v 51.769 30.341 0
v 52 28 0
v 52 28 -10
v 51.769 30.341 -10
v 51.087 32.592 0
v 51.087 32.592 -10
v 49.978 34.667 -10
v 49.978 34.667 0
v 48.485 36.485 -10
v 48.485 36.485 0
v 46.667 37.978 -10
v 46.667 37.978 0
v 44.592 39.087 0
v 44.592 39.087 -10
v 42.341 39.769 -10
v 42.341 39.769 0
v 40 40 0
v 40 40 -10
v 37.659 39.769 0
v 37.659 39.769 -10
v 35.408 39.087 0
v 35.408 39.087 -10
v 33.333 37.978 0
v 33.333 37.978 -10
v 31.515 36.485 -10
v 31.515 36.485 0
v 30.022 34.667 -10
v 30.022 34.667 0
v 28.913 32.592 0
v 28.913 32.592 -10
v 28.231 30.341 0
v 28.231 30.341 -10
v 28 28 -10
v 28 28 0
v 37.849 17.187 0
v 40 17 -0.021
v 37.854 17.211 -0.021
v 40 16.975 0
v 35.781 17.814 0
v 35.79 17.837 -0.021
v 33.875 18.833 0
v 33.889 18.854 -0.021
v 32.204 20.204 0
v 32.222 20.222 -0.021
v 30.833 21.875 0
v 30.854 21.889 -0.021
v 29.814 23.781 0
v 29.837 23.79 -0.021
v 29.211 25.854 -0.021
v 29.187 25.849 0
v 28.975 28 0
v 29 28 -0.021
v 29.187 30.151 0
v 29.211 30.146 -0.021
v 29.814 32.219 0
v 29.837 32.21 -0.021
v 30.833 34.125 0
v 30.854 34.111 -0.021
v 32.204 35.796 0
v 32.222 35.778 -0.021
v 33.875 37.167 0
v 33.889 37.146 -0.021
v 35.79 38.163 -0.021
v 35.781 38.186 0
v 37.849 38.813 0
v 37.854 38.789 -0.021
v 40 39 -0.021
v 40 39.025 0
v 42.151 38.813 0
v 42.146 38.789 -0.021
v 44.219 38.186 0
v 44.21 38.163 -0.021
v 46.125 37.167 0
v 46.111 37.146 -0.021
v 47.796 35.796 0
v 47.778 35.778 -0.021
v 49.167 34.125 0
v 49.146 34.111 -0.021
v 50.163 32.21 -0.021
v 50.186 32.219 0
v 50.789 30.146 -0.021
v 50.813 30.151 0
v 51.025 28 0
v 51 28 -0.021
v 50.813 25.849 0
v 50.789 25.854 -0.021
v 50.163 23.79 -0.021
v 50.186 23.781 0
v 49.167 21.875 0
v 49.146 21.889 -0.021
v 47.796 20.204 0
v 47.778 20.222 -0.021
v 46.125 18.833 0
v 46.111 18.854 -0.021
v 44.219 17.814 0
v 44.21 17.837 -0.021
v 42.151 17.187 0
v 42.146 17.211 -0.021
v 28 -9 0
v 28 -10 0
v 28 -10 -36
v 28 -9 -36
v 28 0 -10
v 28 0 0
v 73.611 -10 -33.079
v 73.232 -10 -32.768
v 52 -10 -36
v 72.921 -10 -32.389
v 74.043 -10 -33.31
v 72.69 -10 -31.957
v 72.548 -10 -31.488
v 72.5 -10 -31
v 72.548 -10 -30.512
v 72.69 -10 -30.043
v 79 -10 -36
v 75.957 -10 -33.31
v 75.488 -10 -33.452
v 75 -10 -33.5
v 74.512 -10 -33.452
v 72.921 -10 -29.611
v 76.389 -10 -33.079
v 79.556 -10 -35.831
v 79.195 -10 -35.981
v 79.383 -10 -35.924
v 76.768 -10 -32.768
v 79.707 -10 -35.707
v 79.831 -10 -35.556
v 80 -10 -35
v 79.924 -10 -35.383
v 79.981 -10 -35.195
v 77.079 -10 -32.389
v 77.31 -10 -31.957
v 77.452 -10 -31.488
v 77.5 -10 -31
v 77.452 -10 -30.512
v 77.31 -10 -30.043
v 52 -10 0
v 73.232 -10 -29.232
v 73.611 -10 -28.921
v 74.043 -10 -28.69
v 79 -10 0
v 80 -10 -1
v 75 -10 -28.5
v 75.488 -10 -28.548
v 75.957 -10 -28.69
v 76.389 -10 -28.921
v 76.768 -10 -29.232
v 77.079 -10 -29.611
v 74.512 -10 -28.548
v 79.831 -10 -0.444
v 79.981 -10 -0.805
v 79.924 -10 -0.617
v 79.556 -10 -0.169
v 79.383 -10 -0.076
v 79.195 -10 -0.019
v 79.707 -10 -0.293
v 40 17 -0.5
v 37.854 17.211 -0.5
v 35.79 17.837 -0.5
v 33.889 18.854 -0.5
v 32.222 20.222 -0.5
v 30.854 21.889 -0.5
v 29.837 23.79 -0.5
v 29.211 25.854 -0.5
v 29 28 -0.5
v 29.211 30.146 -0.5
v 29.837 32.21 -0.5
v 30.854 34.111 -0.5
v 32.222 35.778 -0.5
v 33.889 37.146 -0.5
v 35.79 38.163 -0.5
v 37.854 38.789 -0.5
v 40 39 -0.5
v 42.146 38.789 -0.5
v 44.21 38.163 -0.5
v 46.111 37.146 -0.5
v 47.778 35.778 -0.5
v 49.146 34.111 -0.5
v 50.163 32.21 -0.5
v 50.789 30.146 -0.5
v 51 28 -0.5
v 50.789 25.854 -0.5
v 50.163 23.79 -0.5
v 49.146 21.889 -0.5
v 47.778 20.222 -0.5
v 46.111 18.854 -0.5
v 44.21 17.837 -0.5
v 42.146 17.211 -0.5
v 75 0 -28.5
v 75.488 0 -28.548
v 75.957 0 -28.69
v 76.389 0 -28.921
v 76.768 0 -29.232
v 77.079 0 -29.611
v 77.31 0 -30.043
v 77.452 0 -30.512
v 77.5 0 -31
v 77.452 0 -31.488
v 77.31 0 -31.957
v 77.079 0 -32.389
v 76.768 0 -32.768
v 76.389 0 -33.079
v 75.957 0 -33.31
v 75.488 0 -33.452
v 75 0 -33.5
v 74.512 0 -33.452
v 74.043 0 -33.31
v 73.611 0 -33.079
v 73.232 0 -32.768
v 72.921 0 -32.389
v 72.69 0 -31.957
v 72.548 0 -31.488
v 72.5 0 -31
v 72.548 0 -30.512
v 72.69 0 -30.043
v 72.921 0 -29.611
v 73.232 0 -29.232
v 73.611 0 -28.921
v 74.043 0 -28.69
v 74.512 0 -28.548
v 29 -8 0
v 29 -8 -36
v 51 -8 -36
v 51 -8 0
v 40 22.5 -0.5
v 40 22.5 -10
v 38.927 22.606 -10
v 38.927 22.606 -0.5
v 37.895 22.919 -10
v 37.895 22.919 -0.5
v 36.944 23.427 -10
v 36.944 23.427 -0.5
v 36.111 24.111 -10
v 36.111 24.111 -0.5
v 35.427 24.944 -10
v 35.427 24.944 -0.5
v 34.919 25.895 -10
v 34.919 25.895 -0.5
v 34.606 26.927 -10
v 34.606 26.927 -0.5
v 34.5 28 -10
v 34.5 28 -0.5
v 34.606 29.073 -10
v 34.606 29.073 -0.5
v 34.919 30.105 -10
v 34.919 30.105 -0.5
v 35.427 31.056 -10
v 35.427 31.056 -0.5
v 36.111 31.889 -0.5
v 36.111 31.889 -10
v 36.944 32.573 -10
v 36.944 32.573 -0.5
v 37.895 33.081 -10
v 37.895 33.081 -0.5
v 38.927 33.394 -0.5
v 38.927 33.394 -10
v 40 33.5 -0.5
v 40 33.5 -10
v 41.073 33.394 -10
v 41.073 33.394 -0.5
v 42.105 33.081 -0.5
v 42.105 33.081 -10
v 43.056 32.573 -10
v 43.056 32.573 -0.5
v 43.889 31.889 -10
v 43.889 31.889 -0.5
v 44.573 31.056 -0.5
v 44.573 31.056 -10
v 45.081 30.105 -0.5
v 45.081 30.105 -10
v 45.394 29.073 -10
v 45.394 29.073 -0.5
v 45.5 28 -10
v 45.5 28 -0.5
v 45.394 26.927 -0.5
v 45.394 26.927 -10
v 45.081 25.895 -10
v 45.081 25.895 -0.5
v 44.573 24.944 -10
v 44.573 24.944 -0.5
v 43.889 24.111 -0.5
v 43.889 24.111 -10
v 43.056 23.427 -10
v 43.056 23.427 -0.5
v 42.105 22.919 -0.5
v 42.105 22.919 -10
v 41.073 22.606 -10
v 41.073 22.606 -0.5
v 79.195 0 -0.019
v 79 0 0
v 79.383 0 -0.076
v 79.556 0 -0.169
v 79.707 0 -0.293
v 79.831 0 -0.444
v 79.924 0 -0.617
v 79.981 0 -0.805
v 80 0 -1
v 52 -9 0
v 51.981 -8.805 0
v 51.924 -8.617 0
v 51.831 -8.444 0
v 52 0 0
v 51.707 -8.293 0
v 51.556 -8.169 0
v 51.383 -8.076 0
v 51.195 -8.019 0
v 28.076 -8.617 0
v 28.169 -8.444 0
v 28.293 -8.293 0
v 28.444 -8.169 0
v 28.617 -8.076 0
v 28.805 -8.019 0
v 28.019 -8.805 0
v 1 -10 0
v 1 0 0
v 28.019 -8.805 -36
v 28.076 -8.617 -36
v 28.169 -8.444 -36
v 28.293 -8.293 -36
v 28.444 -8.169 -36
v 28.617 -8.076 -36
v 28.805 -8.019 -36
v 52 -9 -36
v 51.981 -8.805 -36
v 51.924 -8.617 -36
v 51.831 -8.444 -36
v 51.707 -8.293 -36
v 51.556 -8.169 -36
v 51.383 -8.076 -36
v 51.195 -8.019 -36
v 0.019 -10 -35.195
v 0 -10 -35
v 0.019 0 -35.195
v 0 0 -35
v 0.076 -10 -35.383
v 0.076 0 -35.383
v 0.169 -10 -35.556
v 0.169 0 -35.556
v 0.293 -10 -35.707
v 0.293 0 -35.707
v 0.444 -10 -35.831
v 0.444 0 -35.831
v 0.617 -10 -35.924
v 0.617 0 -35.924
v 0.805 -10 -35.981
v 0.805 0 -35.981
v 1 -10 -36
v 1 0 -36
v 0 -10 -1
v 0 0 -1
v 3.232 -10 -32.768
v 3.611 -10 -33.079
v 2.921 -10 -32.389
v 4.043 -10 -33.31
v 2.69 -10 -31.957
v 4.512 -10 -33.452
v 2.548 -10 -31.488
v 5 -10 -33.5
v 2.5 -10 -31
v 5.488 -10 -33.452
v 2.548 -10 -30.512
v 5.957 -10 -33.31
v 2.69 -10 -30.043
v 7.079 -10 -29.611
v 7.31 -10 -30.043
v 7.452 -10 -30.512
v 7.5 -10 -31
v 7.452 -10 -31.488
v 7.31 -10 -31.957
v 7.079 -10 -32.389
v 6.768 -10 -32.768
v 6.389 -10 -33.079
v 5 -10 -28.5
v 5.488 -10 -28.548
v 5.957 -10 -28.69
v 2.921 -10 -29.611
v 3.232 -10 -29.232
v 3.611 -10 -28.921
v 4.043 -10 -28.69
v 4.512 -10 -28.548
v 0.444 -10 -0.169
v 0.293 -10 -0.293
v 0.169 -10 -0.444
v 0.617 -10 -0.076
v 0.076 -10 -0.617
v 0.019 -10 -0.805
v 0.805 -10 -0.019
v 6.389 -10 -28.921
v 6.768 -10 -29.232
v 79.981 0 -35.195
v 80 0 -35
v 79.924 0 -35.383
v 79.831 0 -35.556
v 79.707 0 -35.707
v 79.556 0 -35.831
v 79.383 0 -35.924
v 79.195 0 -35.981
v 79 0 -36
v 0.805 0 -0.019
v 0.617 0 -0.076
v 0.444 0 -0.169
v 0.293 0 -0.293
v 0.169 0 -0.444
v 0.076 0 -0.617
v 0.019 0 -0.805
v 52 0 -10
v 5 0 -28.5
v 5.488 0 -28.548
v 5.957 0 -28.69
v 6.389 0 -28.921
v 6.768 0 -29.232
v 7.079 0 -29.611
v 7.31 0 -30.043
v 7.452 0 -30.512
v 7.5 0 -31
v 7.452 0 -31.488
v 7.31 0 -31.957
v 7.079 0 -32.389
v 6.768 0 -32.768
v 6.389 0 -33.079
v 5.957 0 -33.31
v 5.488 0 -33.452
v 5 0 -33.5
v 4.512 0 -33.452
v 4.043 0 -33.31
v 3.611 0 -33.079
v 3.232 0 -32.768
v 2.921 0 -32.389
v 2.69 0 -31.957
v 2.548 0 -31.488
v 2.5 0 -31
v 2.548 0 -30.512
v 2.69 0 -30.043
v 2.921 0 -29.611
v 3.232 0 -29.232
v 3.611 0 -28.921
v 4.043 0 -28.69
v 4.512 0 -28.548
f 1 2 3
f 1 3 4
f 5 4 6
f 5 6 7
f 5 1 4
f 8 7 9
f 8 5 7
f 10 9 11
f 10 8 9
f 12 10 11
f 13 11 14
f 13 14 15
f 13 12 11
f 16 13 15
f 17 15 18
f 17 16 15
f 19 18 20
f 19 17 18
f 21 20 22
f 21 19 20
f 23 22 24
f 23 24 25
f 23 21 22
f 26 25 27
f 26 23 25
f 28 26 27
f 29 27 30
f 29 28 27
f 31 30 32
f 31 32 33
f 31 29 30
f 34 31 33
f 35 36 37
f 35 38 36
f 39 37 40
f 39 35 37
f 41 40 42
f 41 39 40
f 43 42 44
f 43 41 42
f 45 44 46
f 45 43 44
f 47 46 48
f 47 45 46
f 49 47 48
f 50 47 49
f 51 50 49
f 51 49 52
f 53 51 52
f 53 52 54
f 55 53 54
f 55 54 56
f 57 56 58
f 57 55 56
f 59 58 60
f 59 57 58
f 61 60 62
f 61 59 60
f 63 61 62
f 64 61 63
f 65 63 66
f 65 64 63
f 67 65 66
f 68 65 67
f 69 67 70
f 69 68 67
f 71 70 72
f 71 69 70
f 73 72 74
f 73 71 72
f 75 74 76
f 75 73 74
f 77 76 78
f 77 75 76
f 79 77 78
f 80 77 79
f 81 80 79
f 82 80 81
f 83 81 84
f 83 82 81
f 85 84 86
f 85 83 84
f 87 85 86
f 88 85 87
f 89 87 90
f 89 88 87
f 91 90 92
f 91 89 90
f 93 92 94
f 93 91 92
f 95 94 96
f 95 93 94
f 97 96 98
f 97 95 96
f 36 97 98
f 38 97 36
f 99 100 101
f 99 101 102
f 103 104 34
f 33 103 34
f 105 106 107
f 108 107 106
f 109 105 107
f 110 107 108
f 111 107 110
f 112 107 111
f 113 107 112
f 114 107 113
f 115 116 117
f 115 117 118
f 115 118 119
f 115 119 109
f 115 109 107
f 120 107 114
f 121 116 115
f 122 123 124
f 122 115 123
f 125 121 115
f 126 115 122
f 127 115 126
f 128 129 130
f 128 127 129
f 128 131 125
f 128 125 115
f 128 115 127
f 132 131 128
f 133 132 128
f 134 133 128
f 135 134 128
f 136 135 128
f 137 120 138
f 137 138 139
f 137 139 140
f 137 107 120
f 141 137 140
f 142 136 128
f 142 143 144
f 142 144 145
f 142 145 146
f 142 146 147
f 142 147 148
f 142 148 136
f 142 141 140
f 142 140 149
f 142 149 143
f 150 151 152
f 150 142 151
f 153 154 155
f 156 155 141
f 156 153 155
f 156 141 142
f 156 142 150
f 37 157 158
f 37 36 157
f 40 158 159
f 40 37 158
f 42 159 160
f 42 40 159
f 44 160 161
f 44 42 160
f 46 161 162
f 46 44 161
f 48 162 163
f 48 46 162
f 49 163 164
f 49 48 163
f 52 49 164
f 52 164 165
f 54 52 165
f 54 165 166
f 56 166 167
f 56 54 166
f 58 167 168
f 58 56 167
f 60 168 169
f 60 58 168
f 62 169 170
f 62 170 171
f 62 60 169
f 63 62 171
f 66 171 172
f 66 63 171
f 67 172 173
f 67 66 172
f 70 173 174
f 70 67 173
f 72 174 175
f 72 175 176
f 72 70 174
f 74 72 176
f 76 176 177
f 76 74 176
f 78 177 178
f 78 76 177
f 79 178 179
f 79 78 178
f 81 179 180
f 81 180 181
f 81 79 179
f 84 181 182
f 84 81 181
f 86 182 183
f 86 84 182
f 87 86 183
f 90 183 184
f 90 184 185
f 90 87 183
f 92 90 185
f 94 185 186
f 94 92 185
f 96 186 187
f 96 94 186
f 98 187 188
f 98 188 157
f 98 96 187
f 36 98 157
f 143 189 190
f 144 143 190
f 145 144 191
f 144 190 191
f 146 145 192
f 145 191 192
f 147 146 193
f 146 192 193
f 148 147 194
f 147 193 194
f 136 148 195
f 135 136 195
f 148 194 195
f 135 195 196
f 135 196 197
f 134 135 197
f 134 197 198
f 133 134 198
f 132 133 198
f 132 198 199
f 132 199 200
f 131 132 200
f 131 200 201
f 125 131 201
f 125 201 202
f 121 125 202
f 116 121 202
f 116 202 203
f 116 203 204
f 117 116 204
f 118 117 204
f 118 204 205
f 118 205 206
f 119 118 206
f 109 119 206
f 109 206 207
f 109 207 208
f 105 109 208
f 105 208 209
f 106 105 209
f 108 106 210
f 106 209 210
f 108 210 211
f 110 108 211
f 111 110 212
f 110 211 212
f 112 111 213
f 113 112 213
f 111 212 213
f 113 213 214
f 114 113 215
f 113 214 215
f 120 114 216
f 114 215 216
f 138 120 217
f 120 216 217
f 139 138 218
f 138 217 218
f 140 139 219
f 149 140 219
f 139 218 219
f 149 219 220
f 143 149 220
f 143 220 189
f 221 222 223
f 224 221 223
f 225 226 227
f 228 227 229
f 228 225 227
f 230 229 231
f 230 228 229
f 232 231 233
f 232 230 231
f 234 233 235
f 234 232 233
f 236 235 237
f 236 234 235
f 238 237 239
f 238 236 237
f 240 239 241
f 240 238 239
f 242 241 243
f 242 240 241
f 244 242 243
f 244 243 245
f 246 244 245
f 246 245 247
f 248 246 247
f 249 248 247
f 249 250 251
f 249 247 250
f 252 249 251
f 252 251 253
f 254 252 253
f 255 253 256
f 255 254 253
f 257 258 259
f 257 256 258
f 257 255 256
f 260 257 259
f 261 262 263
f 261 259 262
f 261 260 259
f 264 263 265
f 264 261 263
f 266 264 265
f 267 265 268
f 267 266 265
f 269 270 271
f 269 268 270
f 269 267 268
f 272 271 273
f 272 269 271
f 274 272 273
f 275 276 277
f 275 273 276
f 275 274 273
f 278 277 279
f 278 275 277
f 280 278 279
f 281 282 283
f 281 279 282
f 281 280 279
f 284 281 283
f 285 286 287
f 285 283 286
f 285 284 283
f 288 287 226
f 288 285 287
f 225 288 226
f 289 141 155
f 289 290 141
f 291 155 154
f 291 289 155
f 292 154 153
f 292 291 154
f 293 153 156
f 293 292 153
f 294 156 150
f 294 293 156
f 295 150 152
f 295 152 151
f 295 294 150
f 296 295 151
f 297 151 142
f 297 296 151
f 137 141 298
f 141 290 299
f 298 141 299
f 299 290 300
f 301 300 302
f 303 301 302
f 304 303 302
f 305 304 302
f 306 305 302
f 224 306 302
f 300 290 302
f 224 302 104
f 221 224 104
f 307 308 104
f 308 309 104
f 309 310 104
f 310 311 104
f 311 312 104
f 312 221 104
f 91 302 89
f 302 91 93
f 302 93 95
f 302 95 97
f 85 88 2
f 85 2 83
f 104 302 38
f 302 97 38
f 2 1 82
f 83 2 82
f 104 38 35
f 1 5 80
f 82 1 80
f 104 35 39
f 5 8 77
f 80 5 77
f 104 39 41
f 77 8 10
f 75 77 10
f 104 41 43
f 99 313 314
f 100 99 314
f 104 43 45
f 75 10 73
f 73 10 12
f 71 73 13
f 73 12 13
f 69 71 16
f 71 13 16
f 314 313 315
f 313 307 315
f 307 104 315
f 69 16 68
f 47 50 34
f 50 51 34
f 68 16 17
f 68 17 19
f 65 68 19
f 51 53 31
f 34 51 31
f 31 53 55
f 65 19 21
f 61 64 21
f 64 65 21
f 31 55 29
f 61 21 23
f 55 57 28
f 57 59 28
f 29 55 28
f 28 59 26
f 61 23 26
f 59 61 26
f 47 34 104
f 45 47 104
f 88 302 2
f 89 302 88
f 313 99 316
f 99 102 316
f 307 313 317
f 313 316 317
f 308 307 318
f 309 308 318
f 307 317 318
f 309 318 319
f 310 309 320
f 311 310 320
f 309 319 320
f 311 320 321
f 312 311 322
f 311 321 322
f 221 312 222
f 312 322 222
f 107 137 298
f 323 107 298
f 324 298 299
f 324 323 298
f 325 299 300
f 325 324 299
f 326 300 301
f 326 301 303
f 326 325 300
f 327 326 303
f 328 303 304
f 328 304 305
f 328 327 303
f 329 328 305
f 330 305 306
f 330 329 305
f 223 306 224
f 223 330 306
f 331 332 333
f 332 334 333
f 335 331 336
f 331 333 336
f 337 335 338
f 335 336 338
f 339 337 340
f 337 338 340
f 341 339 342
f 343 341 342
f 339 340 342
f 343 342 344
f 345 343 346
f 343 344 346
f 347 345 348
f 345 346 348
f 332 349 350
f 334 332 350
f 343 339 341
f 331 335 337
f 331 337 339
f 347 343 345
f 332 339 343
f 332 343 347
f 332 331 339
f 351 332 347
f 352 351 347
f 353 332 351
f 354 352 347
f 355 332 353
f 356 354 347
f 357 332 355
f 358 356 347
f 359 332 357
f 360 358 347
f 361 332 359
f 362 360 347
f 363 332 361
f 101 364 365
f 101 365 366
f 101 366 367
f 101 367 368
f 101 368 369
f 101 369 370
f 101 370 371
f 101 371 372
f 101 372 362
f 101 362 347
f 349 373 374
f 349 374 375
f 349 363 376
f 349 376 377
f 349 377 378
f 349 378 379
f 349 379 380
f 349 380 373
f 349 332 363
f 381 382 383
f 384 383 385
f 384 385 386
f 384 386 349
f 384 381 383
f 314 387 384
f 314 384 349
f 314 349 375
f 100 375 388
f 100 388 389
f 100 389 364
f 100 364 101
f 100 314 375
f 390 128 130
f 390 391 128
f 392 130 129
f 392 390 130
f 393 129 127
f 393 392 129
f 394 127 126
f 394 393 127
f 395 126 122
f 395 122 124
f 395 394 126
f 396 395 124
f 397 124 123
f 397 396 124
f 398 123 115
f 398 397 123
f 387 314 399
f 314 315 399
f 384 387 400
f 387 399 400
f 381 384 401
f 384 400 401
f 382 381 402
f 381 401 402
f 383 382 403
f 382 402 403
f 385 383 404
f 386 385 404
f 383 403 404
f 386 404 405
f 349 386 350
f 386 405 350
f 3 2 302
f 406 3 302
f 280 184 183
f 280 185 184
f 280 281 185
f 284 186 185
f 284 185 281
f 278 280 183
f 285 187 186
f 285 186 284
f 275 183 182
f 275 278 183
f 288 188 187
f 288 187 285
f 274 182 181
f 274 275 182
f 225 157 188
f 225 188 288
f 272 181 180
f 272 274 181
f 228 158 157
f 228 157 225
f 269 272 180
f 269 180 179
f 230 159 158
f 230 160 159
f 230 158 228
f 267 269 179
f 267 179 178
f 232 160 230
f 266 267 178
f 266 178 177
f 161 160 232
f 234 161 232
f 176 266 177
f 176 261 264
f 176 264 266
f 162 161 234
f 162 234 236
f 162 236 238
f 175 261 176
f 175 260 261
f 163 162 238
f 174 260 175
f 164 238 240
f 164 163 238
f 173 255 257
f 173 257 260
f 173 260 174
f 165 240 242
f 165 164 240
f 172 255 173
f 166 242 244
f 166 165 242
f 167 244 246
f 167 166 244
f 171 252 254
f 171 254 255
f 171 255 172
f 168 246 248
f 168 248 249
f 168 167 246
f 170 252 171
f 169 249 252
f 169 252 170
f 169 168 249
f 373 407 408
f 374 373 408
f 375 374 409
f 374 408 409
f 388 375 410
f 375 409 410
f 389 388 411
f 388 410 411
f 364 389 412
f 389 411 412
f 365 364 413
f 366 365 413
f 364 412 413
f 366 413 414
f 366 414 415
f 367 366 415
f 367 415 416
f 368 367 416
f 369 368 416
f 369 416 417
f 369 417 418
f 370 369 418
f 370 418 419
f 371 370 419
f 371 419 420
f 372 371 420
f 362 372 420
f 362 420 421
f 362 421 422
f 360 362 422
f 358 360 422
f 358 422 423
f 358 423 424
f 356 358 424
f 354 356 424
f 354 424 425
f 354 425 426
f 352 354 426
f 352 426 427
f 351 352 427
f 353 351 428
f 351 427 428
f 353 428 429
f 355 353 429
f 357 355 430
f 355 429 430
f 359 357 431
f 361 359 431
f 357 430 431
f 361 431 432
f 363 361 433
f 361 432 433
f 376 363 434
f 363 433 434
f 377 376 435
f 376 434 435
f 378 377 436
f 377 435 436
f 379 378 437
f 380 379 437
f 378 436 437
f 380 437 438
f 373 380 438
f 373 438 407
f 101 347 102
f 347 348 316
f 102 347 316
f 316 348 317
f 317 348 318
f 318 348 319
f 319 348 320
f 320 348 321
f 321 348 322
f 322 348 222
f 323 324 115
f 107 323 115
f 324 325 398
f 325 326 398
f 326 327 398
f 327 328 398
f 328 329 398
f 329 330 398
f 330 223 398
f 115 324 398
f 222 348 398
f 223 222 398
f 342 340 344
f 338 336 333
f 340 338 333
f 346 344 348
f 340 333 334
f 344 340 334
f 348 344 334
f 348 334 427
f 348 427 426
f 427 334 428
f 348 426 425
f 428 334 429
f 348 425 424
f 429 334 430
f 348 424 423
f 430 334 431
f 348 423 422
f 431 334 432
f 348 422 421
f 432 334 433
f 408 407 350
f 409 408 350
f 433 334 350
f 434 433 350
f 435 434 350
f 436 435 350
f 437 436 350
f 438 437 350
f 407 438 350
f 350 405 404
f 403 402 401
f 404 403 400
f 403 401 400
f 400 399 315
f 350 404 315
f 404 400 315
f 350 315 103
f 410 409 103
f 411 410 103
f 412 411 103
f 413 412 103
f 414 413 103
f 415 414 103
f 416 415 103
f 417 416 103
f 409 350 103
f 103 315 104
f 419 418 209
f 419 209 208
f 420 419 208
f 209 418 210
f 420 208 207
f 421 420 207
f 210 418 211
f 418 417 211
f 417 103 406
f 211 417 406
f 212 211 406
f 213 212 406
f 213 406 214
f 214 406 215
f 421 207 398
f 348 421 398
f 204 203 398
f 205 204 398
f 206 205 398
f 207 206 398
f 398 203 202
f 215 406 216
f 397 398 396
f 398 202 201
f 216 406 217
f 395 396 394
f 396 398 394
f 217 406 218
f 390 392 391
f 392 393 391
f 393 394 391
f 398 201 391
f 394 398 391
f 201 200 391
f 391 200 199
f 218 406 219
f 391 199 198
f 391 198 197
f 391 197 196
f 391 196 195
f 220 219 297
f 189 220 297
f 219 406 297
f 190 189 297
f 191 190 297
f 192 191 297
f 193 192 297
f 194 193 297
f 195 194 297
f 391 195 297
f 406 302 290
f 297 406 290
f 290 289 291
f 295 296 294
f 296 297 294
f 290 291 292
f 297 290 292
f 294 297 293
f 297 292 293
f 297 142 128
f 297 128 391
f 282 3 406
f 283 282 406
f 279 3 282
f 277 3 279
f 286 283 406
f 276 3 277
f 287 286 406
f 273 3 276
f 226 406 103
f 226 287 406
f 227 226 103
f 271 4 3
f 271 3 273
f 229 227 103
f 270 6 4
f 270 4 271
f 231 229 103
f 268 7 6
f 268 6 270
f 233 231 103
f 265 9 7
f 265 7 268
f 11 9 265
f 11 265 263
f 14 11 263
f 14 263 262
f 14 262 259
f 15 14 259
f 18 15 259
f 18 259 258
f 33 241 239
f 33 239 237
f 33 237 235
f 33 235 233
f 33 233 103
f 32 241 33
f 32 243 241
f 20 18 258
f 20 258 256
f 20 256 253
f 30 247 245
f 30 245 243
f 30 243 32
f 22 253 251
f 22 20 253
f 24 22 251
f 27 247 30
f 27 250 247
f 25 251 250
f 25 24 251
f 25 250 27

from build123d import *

# Parameters (mm, degrees)
SKETCH_1_W          = 80
SKETCH_1_H          = 10
EXTRUDE_1_DEPTH     = 36
EXTRUDE_3_DEPTH     = 10
FILLET_1_RADIUS     = 12
FILLET_1_LENGTH     = 10
SKETCH_3_W          = 24
SKETCH_3_H          = 2
CUT_EXTRUDE_1_DEPTH = 97.415766346
SKETCH_6_R          = 2.5
CUT_EXTRUDE_2_DEPTH = 97.415766346
FILLET_2_R          = 1


with BuildPart() as part:
    # 草图1 → 凸台-拉伸1 (new body)
    with BuildSketch(Plane.XY):
        with Locations((40, -5)):
            Rectangle(SKETCH_1_W, SKETCH_1_H)
    extrude(amount=-EXTRUDE_1_DEPTH)

    # 草图2 → 凸台-拉伸3 (add)
    with BuildSketch(Plane.XY):
        Polygon((28, 0), (28, 40), (52, 40), (52, 0), (80, 0), (80, -10), (0, -10), (0, 0), align=None)
    extrude(amount=-EXTRUDE_3_DEPTH)

    # 圆角1: full round fillet: the end face becomes a half cylinder, R = half its width
    fillet_1_face = Plane((40, 40, -5), x_dir=(0, 0, 1), z_dir=(0, 1, 0))  # on the end face: x along it, z out of the body
    fillet_1_slab = fillet_1_face.offset(-FILLET_1_RADIUS / 2) * Box(FILLET_1_LENGTH, 2 * FILLET_1_RADIUS, FILLET_1_RADIUS, mode=Mode.PRIVATE)  # the body's end, R deep
    fillet_1_round = Plane((40, 28, -5), x_dir=(0, 1, 0), z_dir=(0, 0, 1)) * Cylinder(FILLET_1_RADIUS, FILLET_1_LENGTH, mode=Mode.PRIVATE)  # its axis R under the face
    add(fillet_1_slab - fillet_1_round, mode=Mode.SUBTRACT)

    # 草图3 → 切除-拉伸1 (cut, through all)
    with BuildSketch(Plane.XY):
        with Locations((40, -9)):
            Rectangle(SKETCH_3_W, SKETCH_3_H)
    extrude(amount=-CUT_EXTRUDE_1_DEPTH, mode=Mode.SUBTRACT)

    # 草图5 → M10 六角头螺栓C级的柱形沉头孔1 (revolve, cut)
    with BuildSketch(Plane(origin=(40, 28, 0), x_dir=(0, -1, 0), z_dir=(1, 0, 0))):
        Polygon((0, 0), (0, 36), (5.5, 36), (5.5, 0.5), (11, 0.5), (11, 0.020977491), (11.025, 0), align=None)
    revolve(axis=Axis((40, 28, 6.35), (0, 0, -1)), mode=Mode.SUBTRACT)

    # 草图6 → 切除-拉伸2 (cut, through all)
    with BuildSketch(Plane(origin=(0, 0, 0), x_dir=(1, 0, 0), z_dir=(0, 1, 0))):
        with Locations(Location((75, 31, 0), (0, 0, 270))):
            Circle(SKETCH_6_R)
        with Locations(Location((5, 31, 0), (0, 0, 270))):
            Circle(SKETCH_6_R)
    extrude(amount=-CUT_EXTRUDE_2_DEPTH, mode=Mode.SUBTRACT)

    # 圆角2
    fillet_2_edges = [part.edges().sort_by_distance(p)[0] for p in [
        (80, -5, -36),
        (0, -5, -36),
        (80, -5, 0),
        (28, -8, -18),
        (52, -8, -18),
        (0, -5, 0),
    ]]
    fillet(fillet_2_edges, radius=FILLET_2_R)


solid = part.part
